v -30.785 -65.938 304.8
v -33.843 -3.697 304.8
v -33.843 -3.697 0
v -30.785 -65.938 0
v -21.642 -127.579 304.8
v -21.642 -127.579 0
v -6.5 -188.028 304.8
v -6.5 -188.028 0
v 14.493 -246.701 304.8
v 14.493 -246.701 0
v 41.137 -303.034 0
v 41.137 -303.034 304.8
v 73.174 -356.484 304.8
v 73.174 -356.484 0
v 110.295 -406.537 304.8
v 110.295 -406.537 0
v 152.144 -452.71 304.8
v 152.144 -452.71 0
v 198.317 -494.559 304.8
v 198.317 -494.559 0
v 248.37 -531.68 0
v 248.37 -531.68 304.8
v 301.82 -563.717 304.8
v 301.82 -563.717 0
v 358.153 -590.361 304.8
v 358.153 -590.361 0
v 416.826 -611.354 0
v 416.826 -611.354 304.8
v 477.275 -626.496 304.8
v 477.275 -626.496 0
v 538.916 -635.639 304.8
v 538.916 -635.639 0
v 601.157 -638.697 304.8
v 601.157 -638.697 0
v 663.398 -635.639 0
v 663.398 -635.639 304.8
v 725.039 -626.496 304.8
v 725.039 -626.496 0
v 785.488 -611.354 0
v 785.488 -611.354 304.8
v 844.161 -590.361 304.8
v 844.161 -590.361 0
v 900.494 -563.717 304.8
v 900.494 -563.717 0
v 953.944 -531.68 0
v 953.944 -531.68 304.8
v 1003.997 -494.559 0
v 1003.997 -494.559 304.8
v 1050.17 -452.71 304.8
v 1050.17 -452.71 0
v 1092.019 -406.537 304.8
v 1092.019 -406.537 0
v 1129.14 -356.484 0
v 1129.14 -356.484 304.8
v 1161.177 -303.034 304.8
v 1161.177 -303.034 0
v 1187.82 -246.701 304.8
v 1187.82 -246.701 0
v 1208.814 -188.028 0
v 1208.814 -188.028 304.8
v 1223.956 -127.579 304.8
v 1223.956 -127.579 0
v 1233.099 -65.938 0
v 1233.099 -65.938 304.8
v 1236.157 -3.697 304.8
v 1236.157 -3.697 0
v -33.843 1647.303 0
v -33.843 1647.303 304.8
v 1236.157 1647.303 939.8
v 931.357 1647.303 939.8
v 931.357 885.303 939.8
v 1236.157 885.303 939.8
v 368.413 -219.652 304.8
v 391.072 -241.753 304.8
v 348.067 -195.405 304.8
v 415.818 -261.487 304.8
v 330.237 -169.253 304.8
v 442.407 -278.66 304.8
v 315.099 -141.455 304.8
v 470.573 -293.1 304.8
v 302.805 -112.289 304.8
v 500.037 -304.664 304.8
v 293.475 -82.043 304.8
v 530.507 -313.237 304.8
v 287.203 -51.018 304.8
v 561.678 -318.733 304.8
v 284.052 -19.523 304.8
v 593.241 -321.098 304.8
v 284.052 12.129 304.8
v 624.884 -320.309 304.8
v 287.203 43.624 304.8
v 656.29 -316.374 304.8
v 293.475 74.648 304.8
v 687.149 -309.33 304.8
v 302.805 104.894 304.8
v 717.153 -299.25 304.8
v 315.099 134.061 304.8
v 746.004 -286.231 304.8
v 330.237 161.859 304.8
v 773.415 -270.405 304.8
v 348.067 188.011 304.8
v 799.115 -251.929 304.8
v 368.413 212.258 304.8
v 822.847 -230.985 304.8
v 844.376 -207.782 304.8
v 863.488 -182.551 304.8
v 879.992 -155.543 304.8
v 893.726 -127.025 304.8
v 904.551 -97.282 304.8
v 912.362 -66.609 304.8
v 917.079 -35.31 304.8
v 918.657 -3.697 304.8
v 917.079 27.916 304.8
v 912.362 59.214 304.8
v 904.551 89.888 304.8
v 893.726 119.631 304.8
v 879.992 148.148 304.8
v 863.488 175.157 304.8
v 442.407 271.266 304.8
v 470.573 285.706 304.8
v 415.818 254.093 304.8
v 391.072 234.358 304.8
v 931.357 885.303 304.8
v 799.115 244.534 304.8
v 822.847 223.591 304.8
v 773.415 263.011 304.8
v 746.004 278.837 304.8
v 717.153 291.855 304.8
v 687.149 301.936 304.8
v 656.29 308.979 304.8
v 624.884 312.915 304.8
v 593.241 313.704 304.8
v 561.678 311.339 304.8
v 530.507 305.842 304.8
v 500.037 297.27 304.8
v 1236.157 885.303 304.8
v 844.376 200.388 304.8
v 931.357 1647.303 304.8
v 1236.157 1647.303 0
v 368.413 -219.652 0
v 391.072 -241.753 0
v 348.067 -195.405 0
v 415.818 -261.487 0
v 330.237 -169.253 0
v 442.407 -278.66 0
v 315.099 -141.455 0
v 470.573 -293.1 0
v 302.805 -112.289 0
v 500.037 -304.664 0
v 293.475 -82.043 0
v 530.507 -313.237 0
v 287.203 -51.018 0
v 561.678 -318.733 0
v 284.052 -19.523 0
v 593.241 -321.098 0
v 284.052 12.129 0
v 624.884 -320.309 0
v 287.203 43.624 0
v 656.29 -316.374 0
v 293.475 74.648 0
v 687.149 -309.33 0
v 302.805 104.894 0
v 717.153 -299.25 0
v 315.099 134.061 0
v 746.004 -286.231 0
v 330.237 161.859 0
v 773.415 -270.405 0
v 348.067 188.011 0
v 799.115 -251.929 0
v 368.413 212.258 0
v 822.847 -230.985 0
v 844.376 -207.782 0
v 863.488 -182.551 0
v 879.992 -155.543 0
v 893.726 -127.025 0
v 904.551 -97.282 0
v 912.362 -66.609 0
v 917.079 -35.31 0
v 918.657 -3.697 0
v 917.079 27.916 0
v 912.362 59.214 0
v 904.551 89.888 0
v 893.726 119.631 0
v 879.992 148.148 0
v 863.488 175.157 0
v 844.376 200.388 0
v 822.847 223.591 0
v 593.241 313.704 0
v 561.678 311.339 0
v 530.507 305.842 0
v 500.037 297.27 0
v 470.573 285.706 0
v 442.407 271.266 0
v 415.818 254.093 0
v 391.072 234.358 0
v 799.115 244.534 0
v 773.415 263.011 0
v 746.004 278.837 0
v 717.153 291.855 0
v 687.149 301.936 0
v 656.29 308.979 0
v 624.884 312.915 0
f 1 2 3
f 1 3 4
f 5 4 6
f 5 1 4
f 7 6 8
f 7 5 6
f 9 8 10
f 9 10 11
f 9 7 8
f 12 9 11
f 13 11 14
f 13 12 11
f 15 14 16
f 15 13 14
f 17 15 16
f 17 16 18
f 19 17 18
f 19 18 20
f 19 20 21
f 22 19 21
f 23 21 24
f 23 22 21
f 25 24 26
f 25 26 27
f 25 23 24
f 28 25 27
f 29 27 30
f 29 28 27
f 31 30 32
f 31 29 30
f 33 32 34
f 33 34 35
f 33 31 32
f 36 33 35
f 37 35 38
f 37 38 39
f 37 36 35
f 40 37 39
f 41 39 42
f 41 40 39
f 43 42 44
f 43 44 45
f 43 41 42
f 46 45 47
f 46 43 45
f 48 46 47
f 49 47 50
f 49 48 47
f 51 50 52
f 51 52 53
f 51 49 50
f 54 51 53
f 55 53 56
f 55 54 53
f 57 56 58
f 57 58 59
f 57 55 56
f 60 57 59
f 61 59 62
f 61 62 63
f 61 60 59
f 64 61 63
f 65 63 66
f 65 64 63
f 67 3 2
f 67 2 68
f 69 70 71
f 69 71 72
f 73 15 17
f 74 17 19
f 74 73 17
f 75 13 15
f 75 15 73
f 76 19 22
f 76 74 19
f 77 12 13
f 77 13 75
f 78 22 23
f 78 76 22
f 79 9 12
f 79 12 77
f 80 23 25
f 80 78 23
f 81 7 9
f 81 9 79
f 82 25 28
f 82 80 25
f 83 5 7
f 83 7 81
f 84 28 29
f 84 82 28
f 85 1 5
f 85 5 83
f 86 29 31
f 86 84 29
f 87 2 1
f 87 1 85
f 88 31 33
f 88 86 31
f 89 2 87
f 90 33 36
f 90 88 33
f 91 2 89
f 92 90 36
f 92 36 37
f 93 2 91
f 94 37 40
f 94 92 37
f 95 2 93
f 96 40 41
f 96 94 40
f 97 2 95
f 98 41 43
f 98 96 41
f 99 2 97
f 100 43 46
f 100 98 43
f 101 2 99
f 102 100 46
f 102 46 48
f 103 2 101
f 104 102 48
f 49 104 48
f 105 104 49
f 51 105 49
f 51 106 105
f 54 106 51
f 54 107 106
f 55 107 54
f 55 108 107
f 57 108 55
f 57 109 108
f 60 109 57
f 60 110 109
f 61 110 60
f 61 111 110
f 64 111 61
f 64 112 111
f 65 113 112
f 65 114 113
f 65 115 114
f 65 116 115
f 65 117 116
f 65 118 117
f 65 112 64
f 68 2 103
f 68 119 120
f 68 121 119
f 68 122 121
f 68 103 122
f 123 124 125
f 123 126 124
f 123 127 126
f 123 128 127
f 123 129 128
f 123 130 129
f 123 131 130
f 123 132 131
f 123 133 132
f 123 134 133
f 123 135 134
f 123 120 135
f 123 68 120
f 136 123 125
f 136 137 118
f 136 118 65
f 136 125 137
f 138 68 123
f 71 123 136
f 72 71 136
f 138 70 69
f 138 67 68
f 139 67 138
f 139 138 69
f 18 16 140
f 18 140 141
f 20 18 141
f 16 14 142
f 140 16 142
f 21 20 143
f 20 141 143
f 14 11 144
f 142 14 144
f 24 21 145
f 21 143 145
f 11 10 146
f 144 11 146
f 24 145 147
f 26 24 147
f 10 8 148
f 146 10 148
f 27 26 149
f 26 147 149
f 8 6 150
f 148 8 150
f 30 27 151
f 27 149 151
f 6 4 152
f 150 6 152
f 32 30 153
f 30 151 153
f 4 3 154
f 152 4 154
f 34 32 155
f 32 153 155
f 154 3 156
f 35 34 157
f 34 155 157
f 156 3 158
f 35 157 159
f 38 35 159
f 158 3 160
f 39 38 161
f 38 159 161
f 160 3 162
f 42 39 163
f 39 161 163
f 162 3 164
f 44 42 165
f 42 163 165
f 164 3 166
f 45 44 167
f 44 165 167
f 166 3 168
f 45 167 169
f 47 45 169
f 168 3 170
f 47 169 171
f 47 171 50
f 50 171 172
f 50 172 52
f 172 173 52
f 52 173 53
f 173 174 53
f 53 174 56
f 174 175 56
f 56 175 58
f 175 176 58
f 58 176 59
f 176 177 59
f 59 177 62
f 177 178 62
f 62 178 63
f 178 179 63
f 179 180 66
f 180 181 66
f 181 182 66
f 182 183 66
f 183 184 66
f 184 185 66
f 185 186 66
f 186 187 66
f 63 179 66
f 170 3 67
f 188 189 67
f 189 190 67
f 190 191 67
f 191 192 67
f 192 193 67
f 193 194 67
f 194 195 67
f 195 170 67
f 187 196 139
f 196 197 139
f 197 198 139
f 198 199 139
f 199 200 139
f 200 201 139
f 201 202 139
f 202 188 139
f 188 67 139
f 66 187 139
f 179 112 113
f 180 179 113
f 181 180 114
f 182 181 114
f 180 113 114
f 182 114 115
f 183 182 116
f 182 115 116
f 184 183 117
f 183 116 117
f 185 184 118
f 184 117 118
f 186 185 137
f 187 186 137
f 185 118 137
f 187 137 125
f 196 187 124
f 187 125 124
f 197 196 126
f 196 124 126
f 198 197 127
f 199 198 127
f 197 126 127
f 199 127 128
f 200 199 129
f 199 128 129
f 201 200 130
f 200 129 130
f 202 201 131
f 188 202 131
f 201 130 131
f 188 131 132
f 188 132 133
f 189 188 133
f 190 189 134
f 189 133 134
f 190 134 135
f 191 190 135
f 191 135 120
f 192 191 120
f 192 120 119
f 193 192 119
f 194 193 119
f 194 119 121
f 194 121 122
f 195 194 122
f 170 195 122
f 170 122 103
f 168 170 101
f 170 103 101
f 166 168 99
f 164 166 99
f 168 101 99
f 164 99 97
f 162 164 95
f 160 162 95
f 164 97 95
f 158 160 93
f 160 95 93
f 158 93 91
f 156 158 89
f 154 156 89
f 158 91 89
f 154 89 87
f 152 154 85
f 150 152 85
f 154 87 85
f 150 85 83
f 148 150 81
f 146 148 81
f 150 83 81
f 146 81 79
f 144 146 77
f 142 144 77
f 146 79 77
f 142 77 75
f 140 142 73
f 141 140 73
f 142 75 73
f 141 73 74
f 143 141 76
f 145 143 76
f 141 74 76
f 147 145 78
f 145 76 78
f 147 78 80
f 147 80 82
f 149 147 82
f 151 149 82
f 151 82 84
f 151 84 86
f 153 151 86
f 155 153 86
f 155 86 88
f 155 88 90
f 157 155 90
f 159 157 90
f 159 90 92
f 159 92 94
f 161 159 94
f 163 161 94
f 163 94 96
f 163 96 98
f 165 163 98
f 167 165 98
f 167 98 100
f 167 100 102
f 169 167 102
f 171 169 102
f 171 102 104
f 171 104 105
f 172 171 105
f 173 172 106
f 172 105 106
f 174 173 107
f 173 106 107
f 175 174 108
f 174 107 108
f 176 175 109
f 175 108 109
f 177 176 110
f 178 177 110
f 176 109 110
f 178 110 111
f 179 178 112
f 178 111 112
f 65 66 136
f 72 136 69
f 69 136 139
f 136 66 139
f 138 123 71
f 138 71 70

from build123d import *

# Parameters (mm, degrees)
F0_W     = 1270
F0_H     = 1651
F1_DEPTH = 304.8
F2_W     = 304.8
F2_H     = 762
F3_DEPTH = 635
F5_DEPTH = 304.8
F6_R     = 317.5
F7_DEPTH = 304.8


with BuildPart() as f1:
    # F0 (on Top) → F1 (new body)
    with BuildSketch(Plane.XY):
        with Locations((601.1569073796, 821.8028554339)):
            Rectangle(F0_W, F0_H)
    extrude(amount=F1_DEPTH)

    # F2 (on face) → F3 (join)
    with BuildSketch(Plane.XY.offset(304.8)):
        with Locations((1083.7569073796, 1266.3028554339)):
            Rectangle(F2_W, F2_H)
    extrude(amount=F3_DEPTH)

    # F4 (on face) → F5 (join)
    with BuildSketch(Plane.XY.offset(304.8)):
        with BuildLine():
            ThreePointArc((-33.8430926204, -3.6971445661), (601.1569073796, -638.6971445661), (1236.1569073796, -3.6971445661))
            Line((1236.1569073796, -3.6971445661), (-33.8430926204, -3.6971445661))
        make_face()
    extrude(amount=-F5_DEPTH)

    # F6 (on face) → F7 (cut)
    with BuildSketch(Plane.XY.offset(304.8)):
        with Locations((601.1569073796, -3.6971445661)):
            Circle(F6_R)
    extrude(amount=-F7_DEPTH, mode=Mode.SUBTRACT)


solid = f1.part
